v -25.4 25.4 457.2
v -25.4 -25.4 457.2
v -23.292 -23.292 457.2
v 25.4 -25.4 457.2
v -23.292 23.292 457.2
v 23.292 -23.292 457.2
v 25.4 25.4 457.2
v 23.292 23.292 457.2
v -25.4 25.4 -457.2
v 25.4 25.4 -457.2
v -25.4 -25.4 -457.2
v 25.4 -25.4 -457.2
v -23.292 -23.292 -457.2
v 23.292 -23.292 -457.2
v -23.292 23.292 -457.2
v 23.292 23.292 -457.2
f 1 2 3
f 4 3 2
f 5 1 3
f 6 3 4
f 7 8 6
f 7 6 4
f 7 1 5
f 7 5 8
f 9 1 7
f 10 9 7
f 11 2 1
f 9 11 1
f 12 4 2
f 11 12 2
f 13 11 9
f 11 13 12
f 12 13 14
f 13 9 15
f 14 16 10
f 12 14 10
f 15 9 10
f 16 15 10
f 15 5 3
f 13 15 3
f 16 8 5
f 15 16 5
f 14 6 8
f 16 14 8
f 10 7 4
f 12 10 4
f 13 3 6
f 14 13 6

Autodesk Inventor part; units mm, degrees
ref_plane "YZ Plane" through (0, 0, 0) normal (1, 0, 0) x (0, 1, 0)
ref_plane "XZ Plane" through (0, 0, 0) normal (0, 1, 0) x (-1, 0, 0)
ref_plane "XY Plane" through (0, 0, 0) normal (0, 0, 1) x (1, 0, 0)
sketch "Sketch1" plane through (0, 0, 0) normal (0, 0, 1) x (1, 0, 0)
  line L0 (-25.4, 25.4) -> (25.4, 25.4)
  line L1 (25.4, 25.4) -> (25.4, -25.4)
  line L2 (25.4, -25.4) -> (-25.4, -25.4)
  line L3 (-25.4, -25.4) -> (-25.4, 25.4)
  line L4 (23.2918, 23.2918) -> (-23.2918, 23.2918)
  line L5 (-23.2918, 23.2918) -> (-23.2918, -23.2918)
  line L6 (-23.2918, -23.2918) -> (23.2918, -23.2918)
  line L7 (23.2918, -23.2918) -> (23.2918, 23.2918)
  point P0 (0, 0)
  point P1 (23.2918, 0)
  point P2 (0, 25.4)
  dimension "d0" = 50.8
  dimension "d1" = 50.8
  dimension "d2" = 2.1082
extrude "Extrusion1" add sketch "Sketch1" along normal mid plane 914.4
properties part number "tube support base"
